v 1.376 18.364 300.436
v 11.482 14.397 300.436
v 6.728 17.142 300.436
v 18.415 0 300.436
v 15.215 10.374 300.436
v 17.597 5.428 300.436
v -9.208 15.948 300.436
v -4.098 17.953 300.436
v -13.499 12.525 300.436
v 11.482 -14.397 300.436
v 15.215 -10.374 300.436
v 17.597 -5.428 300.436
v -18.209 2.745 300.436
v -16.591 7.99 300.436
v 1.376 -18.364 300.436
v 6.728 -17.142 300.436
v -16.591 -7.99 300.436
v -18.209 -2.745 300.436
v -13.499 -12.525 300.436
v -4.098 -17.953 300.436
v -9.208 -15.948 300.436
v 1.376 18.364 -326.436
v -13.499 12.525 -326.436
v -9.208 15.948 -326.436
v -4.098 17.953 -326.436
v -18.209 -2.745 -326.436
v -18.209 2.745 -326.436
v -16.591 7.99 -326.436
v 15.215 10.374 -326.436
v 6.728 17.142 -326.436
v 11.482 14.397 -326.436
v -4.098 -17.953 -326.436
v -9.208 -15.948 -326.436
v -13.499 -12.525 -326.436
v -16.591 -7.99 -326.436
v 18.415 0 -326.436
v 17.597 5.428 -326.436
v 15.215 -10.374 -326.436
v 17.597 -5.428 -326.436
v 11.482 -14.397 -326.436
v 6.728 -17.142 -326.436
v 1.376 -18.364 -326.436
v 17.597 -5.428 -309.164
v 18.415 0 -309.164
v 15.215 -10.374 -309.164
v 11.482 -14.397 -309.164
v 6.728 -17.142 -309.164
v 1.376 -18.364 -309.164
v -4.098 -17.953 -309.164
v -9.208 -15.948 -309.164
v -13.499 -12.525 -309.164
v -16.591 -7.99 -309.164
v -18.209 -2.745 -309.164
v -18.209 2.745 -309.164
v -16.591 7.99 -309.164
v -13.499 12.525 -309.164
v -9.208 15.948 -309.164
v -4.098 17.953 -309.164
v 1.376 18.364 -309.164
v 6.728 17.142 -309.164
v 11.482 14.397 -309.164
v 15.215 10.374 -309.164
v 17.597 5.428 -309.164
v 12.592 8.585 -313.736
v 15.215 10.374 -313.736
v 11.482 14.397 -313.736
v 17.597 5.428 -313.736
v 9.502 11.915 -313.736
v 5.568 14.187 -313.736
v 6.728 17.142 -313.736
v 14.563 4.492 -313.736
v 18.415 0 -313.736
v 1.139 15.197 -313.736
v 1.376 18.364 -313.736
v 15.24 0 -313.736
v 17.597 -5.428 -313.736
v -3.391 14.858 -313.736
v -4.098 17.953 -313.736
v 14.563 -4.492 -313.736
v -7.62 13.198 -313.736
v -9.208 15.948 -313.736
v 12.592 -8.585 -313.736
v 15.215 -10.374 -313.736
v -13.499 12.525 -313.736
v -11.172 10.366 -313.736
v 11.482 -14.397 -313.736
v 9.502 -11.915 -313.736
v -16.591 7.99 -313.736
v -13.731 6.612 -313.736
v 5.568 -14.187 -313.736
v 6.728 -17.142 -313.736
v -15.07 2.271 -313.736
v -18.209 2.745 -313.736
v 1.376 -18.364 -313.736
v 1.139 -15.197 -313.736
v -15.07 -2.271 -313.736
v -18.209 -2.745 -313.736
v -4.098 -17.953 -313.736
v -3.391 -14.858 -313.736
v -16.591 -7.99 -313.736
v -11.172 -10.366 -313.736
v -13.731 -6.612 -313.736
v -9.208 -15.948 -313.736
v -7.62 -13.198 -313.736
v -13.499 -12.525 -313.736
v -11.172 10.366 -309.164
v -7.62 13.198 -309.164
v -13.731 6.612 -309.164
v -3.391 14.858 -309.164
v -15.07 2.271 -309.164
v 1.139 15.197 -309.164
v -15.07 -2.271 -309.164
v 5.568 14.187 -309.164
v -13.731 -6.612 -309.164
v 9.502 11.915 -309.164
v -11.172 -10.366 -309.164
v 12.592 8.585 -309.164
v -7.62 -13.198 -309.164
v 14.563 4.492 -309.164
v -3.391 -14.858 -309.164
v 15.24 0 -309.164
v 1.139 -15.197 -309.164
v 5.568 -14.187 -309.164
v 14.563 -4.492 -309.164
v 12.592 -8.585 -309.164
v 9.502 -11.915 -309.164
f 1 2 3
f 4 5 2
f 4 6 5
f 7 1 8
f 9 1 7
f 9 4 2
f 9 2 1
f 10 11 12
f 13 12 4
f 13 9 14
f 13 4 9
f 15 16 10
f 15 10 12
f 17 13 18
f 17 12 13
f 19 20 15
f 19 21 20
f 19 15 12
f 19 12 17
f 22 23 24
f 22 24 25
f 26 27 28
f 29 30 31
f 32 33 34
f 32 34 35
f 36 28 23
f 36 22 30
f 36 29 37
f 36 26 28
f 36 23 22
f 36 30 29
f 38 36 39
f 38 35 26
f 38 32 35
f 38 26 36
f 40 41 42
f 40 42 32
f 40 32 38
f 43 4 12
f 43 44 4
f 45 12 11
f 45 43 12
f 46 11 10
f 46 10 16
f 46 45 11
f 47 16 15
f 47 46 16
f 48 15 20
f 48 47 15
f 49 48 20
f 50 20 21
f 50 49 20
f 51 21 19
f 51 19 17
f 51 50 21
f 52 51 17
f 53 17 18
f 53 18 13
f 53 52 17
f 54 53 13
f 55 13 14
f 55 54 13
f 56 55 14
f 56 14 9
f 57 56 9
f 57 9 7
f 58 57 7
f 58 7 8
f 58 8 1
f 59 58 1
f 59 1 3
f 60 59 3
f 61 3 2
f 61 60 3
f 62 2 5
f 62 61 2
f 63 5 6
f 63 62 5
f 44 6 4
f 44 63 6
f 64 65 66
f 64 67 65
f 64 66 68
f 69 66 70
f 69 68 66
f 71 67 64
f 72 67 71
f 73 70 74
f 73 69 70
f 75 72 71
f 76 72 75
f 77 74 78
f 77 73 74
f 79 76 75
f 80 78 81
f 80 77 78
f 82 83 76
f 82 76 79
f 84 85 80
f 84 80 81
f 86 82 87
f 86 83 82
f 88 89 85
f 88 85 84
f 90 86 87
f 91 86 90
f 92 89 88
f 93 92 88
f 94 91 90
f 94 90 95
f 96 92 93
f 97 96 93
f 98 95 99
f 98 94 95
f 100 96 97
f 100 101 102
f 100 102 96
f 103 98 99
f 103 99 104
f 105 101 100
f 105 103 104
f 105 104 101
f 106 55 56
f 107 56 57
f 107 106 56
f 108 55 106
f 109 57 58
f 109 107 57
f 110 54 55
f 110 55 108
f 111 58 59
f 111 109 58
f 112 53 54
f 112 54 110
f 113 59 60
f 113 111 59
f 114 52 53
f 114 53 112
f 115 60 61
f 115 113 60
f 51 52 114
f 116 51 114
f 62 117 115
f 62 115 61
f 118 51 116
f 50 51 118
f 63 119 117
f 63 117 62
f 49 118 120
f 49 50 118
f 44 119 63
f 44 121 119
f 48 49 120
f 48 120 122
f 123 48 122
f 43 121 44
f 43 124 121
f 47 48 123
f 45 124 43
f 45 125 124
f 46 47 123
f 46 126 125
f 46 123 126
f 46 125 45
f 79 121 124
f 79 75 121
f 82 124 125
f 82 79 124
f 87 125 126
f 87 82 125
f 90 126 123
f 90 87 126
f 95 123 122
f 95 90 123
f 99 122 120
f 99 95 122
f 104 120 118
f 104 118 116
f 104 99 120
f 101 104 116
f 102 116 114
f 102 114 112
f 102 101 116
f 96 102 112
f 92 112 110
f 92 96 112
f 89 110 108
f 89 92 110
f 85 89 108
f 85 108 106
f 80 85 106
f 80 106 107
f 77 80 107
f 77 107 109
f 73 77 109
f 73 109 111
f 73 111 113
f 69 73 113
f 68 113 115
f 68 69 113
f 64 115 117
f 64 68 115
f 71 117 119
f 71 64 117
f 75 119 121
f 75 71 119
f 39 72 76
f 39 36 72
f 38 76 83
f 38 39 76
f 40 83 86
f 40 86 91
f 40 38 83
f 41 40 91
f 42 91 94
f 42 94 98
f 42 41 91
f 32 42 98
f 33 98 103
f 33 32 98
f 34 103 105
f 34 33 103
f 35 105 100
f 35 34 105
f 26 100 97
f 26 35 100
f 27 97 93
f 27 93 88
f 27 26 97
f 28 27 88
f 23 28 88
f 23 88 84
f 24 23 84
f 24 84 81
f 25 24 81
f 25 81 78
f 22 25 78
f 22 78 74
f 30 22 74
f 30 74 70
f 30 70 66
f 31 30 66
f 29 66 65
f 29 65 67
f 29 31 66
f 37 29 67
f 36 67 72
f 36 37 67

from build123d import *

# Parameters (mm, degrees)
SCALE1_SCALE = 25.4


with BuildPart() as part:
    # Sketch1 → Revolve1 (revolve)
    with BuildSketch(Plane(origin=(0, 0, 0), x_dir=(0, 0, -1), z_dir=(1, 0, 0)), mode=Mode.PRIVATE) as revolve1_sk:
        Polygon((0, 0.725), (24, 0.725), (24, 0.6), (24.18, 0.6), (24.18, 0.725), (24.68, 0.725), (24.68, 0), (0, 0), align=None)
    revolve(revolve1_sk.sketch.rotate(Axis((0, 0, 0), (0, 0, -1)), 90), axis=Axis((0, 0, 0), (0, 0, -1)))


with BuildPart() as part_1:
    # Scale1: scaled about (0, 0, -12.312934608)
    add(part.part.scale(SCALE1_SCALE).moved(Location((0, 0, 300.435604435))))


solid = part_1.part
